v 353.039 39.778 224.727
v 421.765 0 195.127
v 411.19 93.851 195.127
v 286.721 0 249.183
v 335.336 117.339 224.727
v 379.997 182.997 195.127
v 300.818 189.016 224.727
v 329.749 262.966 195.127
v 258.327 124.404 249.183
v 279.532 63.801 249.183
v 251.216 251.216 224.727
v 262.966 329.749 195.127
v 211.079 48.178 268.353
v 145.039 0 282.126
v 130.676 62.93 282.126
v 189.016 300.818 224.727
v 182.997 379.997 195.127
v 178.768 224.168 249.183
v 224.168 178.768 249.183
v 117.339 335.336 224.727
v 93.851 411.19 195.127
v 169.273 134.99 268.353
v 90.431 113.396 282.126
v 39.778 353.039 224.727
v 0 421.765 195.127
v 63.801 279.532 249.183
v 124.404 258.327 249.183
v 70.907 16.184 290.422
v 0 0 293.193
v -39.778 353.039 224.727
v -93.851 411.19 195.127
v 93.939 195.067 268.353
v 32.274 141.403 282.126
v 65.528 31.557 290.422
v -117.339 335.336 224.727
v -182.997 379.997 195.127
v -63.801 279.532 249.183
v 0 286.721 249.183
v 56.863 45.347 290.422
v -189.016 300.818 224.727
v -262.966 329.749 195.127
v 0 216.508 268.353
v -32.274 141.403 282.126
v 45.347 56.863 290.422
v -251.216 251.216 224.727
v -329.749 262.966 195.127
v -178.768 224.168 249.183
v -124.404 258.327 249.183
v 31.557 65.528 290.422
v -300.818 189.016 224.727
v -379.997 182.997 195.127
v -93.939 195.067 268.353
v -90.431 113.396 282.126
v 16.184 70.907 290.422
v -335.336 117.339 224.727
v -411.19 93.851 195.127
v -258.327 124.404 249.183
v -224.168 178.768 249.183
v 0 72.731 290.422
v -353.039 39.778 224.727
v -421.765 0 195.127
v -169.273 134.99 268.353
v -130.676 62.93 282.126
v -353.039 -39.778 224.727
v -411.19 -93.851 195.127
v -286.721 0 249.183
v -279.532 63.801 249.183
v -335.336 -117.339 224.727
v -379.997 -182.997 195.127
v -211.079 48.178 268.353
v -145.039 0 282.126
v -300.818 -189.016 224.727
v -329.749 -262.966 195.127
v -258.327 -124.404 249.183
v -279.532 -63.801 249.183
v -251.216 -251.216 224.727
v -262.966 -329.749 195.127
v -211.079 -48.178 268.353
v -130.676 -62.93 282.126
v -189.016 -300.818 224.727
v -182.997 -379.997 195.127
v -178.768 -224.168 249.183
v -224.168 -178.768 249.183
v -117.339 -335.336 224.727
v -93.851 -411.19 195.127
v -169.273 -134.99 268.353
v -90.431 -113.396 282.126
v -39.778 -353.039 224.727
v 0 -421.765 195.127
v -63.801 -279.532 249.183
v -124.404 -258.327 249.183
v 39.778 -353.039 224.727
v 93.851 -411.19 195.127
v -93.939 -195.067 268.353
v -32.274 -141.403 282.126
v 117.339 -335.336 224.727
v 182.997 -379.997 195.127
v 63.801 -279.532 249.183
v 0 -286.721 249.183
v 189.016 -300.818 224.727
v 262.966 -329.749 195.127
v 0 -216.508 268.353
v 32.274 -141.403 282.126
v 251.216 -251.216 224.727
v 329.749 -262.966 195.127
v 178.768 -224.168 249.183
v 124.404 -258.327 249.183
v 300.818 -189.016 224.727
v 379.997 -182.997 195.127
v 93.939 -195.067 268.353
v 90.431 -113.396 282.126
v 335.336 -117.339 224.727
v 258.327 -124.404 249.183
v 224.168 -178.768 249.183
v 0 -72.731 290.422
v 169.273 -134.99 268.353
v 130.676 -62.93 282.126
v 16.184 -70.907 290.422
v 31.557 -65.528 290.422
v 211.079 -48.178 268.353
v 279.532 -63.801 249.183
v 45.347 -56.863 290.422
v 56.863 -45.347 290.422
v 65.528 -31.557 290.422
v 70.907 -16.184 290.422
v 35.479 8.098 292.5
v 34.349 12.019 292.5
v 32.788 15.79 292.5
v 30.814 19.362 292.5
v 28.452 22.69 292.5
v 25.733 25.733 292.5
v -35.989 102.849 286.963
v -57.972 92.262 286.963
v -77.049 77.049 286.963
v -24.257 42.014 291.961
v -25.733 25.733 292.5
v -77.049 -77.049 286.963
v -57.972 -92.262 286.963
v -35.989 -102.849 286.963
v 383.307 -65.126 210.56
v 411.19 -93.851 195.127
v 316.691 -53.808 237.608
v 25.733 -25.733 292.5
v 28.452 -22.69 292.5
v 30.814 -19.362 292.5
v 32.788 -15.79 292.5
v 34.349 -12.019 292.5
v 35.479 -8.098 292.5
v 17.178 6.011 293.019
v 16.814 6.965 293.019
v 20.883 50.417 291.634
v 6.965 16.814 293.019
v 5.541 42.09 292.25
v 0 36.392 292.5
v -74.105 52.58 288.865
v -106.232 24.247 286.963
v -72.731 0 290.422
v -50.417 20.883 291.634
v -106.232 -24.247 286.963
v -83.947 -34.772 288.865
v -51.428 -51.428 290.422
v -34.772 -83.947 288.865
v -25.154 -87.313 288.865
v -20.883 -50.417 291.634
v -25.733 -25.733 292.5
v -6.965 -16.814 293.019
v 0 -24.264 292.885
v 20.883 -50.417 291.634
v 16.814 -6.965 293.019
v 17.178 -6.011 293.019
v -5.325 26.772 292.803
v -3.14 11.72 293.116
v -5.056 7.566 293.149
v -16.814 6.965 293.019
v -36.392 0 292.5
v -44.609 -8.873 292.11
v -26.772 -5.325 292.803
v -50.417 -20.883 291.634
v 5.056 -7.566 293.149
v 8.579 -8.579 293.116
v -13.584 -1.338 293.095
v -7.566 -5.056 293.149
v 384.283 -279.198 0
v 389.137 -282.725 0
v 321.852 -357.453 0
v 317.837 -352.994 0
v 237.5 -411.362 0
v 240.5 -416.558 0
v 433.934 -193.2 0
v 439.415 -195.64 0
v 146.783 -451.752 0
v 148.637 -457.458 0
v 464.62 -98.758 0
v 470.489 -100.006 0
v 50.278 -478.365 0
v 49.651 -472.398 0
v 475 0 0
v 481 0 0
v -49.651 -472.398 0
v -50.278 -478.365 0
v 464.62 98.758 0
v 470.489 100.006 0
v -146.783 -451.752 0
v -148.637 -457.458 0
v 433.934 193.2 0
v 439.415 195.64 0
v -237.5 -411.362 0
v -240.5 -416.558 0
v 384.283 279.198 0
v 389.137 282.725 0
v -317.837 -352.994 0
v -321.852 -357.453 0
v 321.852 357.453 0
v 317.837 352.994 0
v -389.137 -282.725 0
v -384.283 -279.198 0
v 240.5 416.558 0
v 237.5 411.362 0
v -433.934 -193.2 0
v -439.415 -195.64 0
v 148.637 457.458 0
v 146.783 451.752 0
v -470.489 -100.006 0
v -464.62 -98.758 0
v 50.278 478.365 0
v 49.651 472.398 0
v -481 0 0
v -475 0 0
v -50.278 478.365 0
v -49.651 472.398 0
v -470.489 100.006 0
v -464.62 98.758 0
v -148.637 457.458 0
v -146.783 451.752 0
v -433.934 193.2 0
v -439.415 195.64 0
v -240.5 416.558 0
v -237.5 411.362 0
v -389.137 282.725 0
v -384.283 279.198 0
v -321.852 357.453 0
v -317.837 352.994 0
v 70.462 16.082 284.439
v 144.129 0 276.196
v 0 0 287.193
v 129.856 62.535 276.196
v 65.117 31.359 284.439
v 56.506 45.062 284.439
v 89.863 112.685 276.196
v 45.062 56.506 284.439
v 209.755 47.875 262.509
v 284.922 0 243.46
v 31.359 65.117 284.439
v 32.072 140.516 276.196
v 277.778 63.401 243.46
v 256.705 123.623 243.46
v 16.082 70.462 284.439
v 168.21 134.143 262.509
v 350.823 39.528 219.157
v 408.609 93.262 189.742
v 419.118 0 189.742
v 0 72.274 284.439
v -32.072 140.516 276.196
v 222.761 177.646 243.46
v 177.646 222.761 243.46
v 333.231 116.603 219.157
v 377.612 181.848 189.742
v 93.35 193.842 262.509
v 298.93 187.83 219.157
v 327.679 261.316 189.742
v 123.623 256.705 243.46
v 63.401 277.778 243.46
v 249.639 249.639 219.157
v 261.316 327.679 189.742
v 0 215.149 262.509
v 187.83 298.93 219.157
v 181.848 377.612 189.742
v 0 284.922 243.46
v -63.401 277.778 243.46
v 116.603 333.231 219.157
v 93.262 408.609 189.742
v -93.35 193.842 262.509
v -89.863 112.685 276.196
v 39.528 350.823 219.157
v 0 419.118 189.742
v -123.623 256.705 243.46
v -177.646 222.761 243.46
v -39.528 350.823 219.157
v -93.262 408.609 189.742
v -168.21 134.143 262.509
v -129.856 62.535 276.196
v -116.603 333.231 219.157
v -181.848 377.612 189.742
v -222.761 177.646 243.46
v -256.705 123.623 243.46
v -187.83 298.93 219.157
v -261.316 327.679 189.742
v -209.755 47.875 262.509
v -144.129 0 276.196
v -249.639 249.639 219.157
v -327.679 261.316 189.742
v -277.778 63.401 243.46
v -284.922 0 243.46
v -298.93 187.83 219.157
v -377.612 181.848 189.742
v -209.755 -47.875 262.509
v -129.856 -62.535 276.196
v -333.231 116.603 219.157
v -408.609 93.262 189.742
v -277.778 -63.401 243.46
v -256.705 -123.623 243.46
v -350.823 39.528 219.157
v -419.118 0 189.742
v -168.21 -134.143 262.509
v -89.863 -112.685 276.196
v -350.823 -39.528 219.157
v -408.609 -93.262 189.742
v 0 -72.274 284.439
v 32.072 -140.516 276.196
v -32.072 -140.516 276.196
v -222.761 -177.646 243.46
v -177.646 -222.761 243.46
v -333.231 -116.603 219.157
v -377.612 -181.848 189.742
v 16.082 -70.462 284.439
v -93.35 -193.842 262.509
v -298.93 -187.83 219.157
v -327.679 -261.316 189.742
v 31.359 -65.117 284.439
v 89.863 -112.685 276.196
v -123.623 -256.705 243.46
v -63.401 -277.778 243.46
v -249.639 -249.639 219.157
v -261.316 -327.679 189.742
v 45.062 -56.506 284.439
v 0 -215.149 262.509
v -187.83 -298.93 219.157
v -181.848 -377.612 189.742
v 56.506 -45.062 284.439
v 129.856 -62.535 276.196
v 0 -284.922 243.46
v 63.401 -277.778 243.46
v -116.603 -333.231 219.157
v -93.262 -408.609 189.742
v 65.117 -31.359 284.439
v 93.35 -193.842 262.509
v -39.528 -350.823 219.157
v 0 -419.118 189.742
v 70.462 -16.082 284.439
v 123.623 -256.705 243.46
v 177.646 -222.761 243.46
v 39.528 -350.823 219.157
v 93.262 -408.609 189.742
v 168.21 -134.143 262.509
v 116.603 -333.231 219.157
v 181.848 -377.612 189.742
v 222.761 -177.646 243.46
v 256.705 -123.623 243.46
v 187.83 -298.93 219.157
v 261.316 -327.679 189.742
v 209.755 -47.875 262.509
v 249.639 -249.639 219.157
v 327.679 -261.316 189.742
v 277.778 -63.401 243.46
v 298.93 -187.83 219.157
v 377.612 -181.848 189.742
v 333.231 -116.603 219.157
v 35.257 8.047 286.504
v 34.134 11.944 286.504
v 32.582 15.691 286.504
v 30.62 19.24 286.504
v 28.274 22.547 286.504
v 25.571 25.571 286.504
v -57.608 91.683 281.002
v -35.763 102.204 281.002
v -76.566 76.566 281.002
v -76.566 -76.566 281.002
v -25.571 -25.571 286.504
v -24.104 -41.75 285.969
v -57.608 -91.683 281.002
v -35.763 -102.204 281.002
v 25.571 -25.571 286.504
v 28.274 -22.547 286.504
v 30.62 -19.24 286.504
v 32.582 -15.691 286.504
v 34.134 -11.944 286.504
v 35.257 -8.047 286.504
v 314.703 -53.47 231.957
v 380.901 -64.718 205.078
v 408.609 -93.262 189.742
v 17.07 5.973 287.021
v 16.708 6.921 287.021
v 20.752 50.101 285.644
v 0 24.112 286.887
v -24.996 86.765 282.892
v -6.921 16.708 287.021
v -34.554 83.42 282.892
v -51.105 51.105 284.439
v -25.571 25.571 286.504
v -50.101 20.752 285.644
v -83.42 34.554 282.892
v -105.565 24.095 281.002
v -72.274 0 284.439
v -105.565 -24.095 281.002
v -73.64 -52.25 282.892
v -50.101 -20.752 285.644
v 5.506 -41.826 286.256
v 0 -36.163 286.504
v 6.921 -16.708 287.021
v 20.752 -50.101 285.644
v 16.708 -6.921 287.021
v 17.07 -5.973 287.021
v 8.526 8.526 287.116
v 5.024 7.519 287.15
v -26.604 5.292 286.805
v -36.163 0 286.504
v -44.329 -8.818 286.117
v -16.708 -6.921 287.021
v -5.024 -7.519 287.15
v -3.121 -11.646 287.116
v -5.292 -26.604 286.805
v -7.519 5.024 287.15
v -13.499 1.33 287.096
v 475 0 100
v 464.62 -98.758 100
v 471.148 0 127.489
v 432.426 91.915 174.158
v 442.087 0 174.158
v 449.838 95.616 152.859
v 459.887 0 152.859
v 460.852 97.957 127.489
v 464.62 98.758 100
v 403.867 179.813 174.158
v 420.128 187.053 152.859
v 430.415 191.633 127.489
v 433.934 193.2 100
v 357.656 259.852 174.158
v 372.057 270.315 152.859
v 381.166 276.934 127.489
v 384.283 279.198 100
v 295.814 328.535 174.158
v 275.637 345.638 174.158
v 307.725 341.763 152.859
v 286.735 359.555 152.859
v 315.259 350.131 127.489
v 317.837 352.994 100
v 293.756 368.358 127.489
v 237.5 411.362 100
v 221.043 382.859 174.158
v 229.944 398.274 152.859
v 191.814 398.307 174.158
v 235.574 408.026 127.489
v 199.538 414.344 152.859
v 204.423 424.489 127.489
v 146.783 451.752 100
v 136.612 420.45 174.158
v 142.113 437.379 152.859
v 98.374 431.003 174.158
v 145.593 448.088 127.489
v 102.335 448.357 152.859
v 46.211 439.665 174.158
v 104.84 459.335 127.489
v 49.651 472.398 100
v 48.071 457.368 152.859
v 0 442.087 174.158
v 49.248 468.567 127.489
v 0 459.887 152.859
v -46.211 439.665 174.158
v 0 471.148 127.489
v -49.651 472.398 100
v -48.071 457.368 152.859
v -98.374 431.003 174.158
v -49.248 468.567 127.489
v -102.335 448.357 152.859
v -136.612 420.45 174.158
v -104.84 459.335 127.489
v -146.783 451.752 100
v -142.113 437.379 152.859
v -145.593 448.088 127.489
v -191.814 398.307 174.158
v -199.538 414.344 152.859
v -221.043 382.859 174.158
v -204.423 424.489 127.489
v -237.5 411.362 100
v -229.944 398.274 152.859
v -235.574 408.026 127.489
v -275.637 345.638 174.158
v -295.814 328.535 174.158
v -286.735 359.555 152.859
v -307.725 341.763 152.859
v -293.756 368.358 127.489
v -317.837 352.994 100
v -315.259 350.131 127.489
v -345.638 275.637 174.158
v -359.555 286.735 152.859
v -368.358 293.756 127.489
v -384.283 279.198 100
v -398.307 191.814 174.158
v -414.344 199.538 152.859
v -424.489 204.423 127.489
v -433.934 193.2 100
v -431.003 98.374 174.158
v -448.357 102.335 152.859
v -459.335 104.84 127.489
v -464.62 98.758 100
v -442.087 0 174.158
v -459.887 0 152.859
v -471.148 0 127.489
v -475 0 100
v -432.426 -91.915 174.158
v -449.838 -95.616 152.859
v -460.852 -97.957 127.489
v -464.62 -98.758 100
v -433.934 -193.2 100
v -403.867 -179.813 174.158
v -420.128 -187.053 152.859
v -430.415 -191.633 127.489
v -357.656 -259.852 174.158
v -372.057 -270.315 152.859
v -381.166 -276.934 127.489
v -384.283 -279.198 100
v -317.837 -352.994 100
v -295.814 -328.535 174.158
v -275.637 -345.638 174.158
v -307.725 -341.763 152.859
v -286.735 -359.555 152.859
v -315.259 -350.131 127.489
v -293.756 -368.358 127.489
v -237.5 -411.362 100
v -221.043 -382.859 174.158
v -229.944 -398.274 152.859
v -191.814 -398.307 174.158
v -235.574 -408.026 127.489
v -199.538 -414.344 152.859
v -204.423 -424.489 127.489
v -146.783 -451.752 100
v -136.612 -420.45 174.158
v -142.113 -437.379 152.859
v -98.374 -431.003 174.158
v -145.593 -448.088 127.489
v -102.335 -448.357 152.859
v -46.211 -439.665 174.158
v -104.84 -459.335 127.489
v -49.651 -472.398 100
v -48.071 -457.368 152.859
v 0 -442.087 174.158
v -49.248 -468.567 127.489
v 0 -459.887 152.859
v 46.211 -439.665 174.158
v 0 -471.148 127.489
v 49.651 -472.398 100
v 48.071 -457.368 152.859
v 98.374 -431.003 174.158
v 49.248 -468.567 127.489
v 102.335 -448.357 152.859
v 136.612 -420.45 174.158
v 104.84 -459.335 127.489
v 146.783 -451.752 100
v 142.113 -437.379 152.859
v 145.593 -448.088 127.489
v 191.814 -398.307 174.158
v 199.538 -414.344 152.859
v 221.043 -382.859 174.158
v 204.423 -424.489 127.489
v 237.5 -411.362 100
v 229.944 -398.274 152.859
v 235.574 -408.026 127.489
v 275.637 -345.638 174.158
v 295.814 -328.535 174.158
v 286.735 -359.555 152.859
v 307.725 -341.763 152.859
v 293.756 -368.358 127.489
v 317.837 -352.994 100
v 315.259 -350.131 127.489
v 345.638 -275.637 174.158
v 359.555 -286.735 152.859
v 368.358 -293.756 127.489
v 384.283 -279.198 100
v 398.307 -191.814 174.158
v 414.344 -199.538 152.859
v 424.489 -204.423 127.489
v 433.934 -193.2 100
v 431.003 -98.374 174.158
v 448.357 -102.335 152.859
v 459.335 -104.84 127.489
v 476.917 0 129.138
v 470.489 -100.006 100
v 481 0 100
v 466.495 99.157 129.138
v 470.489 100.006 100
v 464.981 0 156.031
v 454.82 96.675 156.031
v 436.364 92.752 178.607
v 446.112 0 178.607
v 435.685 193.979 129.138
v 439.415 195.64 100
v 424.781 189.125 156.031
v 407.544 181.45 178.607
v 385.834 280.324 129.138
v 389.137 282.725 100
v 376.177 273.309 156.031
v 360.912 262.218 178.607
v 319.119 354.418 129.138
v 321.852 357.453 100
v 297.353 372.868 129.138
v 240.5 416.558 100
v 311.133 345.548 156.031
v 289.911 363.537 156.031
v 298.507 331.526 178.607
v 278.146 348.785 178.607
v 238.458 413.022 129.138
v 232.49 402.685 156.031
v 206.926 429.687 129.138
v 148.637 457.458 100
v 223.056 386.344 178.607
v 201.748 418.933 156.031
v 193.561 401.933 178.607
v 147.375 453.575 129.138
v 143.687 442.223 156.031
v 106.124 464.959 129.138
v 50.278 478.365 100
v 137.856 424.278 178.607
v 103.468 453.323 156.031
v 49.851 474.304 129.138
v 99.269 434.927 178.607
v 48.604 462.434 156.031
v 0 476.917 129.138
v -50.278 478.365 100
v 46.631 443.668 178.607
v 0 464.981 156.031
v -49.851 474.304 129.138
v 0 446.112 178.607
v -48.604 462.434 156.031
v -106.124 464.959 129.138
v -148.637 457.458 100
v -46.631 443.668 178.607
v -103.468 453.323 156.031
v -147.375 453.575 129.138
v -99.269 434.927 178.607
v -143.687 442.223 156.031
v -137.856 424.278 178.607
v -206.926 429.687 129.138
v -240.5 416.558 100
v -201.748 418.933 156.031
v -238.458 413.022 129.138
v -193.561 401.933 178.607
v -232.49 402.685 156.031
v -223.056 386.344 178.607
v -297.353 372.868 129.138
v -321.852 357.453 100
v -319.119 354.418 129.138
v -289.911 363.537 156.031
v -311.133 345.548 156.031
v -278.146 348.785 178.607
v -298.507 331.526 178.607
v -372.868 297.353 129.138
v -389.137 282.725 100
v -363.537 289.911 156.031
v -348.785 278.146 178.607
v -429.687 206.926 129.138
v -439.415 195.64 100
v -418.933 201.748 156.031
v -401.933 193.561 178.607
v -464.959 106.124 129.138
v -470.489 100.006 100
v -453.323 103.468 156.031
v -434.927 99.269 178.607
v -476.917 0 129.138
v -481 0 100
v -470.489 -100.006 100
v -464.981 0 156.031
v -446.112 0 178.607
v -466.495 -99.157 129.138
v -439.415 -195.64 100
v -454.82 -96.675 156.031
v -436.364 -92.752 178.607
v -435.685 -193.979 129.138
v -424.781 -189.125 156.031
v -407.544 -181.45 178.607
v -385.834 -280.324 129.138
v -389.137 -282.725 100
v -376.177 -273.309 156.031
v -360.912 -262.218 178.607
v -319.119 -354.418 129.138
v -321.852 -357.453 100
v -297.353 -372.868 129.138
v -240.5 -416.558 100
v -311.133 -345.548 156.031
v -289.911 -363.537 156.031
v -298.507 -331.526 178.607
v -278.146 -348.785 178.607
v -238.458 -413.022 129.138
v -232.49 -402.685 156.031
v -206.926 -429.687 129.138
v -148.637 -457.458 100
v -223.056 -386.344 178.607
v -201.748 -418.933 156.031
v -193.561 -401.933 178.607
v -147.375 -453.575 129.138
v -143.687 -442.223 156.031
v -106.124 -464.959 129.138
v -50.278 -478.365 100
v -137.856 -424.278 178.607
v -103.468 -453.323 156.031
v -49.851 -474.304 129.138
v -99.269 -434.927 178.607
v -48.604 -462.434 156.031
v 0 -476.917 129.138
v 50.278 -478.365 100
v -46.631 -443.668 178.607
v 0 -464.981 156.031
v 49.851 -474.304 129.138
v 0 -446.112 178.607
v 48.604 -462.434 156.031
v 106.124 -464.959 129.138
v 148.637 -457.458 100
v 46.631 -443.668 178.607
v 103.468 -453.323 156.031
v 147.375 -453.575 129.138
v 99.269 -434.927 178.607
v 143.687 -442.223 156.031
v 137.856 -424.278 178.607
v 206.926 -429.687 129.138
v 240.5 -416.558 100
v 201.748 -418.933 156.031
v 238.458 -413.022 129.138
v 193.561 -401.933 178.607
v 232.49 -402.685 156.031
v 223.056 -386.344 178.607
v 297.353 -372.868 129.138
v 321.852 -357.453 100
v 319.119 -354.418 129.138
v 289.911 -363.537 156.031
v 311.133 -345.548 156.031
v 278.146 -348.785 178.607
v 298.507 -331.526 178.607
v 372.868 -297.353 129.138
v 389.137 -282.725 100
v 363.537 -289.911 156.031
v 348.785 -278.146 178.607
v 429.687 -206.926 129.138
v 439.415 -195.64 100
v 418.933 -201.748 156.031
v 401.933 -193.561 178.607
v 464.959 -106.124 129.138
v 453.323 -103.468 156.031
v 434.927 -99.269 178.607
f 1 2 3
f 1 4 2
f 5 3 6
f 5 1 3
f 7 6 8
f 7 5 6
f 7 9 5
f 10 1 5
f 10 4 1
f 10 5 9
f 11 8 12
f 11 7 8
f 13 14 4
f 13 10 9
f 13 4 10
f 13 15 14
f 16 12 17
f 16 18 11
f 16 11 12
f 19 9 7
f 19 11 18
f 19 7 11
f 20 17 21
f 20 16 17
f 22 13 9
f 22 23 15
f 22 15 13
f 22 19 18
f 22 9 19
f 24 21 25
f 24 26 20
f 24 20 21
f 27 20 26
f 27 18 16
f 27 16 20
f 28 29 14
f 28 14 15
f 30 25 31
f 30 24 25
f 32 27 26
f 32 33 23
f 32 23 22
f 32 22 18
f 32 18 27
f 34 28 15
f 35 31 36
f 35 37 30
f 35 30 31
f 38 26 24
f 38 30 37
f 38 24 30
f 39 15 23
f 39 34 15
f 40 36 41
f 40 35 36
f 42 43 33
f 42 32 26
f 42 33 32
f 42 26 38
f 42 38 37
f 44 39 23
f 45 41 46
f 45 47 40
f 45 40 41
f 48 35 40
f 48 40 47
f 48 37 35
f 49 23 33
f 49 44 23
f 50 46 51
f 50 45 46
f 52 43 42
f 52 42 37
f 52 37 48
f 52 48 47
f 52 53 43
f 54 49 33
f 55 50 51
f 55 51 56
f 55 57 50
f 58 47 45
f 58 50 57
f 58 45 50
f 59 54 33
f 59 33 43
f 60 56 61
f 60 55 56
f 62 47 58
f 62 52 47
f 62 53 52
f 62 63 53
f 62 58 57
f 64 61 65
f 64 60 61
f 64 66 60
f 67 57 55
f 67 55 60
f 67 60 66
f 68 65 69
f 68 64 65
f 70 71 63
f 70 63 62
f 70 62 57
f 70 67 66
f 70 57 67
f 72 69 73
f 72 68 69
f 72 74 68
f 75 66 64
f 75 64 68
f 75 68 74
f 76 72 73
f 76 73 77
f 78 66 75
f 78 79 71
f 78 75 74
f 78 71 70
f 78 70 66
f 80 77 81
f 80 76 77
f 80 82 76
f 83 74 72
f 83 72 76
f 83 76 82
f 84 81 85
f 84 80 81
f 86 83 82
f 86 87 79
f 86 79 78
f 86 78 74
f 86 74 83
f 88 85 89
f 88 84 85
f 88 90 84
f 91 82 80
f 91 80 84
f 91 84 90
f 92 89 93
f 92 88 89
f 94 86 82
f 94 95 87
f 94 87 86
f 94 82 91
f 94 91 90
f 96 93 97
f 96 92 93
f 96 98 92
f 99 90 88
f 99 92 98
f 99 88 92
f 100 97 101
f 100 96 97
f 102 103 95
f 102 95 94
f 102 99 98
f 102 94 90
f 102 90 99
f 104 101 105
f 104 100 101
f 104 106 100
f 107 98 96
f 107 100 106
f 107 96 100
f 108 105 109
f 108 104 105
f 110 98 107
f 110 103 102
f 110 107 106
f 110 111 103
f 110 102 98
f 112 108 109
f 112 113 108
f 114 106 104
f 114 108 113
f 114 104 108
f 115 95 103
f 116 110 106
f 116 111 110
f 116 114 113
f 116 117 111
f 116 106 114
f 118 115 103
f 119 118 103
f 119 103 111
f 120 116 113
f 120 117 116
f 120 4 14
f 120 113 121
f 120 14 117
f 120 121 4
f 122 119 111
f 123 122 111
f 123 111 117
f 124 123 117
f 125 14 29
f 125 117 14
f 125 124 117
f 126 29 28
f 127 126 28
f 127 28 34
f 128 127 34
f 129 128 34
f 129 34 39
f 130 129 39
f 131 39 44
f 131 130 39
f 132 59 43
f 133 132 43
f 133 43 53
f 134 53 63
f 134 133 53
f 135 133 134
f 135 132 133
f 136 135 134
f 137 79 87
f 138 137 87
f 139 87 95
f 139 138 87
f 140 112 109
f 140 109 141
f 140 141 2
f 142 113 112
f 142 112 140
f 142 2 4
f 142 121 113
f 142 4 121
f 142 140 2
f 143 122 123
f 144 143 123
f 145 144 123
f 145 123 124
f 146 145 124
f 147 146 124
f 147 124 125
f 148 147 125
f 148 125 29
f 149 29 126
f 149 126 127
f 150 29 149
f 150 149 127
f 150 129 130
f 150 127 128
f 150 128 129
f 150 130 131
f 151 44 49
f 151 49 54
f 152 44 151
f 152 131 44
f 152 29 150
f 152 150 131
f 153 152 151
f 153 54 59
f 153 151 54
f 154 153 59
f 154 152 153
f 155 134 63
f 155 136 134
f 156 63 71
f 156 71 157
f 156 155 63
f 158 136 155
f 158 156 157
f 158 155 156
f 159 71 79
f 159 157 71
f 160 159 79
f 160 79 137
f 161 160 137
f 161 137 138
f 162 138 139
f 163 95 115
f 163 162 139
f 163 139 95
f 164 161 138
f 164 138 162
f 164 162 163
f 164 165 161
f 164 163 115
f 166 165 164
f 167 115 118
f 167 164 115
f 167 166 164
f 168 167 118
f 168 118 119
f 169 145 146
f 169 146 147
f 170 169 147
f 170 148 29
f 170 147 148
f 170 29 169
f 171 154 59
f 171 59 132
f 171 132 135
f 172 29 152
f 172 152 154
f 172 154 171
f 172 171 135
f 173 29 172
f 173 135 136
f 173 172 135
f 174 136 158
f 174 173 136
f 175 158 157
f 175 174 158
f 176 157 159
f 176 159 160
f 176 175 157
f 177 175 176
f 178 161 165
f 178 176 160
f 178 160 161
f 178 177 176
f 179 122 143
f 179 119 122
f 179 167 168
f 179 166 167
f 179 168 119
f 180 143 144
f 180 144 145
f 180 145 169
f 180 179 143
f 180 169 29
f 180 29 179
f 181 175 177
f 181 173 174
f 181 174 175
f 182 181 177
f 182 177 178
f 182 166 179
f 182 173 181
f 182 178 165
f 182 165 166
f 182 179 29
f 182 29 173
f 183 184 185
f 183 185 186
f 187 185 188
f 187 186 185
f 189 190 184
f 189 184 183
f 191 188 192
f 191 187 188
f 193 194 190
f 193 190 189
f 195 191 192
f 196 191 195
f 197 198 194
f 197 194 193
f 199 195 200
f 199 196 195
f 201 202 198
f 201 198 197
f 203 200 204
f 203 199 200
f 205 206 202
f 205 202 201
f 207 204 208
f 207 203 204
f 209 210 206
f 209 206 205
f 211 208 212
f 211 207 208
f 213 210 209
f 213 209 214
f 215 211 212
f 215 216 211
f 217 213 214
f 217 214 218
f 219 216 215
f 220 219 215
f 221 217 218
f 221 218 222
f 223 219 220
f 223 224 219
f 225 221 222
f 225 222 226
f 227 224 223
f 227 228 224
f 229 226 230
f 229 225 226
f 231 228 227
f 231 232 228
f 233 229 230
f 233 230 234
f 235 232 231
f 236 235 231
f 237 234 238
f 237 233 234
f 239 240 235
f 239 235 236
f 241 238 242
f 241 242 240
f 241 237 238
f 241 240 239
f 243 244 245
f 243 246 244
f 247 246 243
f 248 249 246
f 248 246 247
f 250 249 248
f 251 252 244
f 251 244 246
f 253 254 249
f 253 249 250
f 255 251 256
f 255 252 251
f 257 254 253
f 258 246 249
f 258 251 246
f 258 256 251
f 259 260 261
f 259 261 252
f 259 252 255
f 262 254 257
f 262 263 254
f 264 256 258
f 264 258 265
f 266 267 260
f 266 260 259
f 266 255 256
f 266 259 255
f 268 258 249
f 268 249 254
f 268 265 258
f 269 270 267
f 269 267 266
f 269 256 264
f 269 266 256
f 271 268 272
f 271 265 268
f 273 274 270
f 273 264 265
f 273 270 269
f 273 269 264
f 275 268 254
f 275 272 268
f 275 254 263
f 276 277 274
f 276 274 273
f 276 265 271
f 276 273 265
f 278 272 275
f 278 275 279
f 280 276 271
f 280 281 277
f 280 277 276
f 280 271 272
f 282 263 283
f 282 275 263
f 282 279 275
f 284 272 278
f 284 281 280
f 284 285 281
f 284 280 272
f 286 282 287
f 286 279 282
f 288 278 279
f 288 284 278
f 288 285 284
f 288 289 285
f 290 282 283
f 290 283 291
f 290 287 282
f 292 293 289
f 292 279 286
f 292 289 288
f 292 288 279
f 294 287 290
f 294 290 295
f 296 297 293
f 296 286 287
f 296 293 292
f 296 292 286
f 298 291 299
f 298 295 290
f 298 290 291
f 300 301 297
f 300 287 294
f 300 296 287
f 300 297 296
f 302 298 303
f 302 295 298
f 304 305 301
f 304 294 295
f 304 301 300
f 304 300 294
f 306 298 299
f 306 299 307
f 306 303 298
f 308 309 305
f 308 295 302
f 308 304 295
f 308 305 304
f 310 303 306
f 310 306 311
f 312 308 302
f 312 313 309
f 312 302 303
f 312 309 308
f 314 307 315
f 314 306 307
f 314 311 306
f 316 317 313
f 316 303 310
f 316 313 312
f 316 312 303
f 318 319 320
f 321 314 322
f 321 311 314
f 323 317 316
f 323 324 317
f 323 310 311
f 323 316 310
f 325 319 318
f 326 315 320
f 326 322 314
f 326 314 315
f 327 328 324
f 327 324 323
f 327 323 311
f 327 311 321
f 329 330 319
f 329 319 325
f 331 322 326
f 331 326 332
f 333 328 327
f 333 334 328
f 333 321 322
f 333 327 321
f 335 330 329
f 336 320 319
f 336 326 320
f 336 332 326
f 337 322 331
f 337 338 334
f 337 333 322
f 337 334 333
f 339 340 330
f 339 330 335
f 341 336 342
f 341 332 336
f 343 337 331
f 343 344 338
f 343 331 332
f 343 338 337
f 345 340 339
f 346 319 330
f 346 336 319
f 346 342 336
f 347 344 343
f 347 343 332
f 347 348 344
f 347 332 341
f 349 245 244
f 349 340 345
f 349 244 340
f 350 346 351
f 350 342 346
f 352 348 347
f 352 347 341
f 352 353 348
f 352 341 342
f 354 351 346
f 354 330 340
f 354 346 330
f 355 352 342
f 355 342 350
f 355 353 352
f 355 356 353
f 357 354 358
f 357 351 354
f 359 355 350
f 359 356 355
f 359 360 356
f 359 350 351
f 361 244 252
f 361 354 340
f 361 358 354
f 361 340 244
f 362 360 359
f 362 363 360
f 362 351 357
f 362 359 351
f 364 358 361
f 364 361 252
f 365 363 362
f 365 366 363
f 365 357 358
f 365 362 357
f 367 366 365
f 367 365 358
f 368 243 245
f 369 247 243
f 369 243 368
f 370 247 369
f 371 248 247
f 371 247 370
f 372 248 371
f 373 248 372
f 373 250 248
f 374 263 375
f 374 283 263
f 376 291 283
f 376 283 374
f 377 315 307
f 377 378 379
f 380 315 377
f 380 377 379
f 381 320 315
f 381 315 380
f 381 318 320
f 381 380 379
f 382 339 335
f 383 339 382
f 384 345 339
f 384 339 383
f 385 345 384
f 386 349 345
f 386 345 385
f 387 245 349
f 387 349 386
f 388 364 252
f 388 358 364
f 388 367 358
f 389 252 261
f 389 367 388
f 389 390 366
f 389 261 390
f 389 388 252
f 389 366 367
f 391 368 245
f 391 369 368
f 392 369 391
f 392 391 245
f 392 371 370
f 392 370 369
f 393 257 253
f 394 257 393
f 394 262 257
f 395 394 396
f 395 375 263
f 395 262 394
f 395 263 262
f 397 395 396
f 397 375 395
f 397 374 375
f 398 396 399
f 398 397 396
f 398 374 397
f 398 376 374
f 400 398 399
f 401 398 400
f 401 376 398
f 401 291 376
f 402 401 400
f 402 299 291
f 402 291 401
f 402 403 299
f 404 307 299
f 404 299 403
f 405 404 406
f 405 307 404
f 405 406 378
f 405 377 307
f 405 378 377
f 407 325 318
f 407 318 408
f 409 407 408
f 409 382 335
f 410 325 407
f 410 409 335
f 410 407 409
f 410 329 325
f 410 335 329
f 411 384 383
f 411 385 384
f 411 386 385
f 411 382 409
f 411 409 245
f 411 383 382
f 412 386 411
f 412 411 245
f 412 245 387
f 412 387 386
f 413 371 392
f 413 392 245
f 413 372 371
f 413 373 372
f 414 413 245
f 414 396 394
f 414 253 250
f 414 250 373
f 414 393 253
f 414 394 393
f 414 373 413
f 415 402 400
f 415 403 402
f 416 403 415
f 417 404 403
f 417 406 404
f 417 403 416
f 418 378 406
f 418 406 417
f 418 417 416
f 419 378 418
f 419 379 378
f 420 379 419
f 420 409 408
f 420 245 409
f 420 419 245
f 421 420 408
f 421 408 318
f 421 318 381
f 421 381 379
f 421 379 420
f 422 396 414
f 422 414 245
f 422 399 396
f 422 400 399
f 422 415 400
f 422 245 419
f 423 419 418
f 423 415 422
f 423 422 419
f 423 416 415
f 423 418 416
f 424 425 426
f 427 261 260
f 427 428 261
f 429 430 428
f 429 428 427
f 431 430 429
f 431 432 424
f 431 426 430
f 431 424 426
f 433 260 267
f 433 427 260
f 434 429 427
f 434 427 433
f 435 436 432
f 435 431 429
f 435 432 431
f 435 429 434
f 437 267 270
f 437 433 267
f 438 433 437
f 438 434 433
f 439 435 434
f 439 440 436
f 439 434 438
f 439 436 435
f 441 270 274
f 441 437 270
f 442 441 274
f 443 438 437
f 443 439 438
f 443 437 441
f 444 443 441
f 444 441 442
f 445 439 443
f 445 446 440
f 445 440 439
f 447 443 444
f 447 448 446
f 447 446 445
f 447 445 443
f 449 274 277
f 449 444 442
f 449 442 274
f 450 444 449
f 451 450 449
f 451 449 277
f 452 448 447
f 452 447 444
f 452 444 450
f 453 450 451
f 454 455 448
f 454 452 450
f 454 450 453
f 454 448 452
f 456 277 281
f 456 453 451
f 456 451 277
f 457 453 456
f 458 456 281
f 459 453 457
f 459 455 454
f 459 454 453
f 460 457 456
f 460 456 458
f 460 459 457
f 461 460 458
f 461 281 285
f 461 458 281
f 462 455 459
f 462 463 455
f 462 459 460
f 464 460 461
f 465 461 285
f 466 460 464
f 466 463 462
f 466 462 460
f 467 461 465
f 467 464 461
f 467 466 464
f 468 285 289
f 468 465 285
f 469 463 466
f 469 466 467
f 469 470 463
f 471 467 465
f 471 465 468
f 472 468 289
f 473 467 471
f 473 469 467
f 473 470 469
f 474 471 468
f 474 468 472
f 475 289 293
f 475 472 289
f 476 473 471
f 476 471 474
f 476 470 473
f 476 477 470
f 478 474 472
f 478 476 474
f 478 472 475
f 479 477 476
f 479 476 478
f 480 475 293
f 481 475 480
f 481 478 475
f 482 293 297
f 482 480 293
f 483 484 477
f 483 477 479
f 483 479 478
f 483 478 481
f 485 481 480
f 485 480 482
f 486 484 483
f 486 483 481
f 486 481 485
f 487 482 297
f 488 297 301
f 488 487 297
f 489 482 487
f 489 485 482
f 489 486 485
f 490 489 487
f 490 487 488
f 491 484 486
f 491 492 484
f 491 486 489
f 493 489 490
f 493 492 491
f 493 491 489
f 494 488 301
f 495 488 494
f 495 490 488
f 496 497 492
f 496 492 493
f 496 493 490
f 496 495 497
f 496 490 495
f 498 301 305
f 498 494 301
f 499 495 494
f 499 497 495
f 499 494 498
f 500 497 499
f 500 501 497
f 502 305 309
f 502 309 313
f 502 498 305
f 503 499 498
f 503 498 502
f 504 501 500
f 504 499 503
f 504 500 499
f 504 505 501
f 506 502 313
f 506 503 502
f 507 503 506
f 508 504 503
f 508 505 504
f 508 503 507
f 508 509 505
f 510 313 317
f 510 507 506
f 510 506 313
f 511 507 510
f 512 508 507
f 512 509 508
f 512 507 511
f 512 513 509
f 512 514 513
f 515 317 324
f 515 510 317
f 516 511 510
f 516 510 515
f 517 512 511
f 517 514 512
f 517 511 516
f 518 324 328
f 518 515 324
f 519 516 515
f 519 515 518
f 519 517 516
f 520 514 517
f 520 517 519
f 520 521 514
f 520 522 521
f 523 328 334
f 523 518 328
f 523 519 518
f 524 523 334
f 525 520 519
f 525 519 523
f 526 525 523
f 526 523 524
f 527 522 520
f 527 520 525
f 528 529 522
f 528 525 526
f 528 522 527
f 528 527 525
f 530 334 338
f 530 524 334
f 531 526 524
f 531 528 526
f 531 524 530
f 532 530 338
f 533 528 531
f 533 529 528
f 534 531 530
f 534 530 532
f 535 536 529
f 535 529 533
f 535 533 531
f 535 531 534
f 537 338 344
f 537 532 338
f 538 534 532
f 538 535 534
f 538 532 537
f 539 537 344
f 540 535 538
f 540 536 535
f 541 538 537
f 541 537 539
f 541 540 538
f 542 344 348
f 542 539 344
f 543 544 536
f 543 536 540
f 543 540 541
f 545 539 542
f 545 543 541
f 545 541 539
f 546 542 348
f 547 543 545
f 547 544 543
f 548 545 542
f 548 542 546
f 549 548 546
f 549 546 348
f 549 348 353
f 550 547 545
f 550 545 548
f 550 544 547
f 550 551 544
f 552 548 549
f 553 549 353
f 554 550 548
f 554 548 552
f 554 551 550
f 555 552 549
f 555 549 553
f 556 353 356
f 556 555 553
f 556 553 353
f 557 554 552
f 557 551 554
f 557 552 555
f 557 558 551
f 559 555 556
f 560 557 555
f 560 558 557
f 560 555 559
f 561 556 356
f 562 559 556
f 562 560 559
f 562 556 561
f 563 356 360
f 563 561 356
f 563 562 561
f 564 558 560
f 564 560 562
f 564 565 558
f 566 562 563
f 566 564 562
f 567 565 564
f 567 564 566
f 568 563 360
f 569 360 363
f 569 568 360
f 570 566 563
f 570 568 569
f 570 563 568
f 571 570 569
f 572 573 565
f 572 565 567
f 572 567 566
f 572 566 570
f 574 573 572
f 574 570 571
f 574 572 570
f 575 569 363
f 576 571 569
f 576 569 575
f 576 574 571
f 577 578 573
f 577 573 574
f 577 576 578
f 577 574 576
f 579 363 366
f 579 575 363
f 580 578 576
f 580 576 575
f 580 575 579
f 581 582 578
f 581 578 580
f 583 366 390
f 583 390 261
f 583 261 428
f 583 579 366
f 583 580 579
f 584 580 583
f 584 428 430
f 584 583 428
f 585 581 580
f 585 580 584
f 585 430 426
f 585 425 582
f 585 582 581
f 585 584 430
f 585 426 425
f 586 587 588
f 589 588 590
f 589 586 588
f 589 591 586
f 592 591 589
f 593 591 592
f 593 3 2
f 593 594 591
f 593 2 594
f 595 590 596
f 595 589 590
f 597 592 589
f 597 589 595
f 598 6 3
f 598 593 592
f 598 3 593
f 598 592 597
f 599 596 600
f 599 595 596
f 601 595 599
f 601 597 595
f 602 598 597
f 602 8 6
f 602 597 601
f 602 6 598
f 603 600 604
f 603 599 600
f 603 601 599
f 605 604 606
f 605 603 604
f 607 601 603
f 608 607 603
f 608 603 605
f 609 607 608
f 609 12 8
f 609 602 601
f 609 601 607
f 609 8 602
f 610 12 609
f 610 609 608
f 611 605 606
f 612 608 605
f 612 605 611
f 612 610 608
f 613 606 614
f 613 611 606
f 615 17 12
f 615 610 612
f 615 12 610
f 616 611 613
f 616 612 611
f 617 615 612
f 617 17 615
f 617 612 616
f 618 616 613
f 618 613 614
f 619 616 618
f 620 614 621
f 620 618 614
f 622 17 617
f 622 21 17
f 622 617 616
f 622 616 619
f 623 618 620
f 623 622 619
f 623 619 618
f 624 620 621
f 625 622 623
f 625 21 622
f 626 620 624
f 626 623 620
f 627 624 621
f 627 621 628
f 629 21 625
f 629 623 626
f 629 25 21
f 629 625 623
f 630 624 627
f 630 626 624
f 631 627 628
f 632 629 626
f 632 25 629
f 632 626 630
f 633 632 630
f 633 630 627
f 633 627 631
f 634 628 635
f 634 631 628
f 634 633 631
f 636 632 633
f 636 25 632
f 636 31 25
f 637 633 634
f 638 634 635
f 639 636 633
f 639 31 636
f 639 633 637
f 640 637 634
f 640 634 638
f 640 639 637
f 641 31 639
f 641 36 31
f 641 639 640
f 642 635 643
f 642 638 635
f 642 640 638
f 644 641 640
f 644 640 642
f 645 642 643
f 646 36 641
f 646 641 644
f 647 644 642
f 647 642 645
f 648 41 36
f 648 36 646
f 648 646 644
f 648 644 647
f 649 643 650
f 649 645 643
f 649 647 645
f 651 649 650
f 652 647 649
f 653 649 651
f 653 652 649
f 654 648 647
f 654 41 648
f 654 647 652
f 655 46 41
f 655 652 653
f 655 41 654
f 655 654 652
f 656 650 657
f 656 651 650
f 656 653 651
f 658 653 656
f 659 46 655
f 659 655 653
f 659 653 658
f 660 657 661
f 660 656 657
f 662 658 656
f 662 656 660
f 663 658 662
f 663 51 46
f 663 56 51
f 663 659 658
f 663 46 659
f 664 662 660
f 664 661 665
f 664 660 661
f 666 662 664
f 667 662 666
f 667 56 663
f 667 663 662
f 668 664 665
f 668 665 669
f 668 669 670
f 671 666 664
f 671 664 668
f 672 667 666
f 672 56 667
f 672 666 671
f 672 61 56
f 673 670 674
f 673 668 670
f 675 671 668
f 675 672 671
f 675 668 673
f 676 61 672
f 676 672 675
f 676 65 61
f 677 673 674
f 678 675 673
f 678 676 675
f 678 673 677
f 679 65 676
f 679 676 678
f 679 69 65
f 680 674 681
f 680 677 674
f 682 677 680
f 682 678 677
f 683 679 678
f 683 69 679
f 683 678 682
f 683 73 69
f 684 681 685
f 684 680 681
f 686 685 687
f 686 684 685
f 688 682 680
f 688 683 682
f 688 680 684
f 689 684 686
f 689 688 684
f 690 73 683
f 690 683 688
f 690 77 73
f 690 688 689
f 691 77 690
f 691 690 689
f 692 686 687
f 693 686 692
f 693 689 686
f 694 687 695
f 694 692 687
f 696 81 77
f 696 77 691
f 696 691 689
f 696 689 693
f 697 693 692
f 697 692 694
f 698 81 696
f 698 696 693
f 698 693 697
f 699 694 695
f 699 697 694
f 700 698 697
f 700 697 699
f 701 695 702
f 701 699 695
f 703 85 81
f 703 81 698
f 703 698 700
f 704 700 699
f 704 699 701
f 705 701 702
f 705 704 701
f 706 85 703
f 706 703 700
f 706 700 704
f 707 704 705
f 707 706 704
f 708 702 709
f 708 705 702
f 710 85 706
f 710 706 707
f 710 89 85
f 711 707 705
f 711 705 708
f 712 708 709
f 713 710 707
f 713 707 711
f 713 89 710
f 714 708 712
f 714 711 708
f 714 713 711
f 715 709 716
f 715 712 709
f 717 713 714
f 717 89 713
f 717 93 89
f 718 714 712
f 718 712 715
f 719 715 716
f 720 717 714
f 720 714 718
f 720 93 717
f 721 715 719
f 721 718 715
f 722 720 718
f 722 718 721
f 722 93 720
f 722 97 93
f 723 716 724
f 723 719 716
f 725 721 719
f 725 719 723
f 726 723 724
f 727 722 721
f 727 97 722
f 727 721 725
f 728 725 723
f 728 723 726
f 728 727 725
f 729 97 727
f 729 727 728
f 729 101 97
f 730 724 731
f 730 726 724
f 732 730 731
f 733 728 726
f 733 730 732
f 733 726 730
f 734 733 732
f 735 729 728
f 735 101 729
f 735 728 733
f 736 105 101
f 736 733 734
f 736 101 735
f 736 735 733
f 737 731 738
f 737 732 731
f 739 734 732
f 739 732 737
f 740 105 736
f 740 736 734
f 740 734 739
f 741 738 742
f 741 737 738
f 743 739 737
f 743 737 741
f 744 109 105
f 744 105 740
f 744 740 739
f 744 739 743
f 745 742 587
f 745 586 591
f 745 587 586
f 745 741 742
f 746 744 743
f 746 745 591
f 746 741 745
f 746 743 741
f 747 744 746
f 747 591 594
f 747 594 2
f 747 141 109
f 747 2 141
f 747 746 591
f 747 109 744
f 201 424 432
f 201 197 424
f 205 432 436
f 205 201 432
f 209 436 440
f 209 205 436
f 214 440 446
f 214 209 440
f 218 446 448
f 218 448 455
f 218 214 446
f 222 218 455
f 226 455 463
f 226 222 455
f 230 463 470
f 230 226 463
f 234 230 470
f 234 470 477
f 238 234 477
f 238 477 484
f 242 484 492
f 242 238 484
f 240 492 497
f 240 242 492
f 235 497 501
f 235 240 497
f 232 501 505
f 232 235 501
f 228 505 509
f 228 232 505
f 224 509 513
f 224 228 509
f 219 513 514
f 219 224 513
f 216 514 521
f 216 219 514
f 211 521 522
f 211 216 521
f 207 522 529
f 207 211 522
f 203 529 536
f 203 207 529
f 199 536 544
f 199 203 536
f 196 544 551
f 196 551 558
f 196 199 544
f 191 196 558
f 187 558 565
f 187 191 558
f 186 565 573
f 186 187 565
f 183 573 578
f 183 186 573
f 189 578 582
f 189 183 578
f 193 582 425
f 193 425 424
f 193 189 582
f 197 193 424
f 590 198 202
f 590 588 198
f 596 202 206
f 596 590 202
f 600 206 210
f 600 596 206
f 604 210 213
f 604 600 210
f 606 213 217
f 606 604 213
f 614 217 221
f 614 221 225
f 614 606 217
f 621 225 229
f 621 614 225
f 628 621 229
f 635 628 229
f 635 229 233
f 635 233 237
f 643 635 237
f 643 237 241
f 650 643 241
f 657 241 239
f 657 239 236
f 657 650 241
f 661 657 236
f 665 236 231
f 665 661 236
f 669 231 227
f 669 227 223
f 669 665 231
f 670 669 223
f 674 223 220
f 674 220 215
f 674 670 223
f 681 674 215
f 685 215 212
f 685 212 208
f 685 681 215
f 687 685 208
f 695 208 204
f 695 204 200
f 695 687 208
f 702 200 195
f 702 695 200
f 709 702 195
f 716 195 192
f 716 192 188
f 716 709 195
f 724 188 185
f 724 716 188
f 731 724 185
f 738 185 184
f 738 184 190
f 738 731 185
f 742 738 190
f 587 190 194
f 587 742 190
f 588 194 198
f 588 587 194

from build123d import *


with BuildPart() as f1:
    # F0 (on Front) → F1 (revolve)
    with BuildSketch(Plane.XZ):
        with BuildLine():
            ThreePointArc((419.117647, 189.742037), (459.887469, 152.859414), (475, 100))
            Line((475, 100), (475, 0))
            Line((475, 0), (481, 0))
            Line((481, 0), (481, 100))
            ThreePointArc((481, 100), (464.980717, 156.030979), (421.764706, 195.126559))
            ThreePointArc((421.764706, 195.126559), (216.507755, 268.353462), (0, 293.192685))
            Line((0, 293.192685), (0, 287.192685))
            ThreePointArc((0, 287.192685), (215.14892, 262.509356), (419.117647, 189.742037))
        make_face()
    revolve(axis=Axis((0, 0, 568.160451), (0, 0, 1)))


solid = f1.part
